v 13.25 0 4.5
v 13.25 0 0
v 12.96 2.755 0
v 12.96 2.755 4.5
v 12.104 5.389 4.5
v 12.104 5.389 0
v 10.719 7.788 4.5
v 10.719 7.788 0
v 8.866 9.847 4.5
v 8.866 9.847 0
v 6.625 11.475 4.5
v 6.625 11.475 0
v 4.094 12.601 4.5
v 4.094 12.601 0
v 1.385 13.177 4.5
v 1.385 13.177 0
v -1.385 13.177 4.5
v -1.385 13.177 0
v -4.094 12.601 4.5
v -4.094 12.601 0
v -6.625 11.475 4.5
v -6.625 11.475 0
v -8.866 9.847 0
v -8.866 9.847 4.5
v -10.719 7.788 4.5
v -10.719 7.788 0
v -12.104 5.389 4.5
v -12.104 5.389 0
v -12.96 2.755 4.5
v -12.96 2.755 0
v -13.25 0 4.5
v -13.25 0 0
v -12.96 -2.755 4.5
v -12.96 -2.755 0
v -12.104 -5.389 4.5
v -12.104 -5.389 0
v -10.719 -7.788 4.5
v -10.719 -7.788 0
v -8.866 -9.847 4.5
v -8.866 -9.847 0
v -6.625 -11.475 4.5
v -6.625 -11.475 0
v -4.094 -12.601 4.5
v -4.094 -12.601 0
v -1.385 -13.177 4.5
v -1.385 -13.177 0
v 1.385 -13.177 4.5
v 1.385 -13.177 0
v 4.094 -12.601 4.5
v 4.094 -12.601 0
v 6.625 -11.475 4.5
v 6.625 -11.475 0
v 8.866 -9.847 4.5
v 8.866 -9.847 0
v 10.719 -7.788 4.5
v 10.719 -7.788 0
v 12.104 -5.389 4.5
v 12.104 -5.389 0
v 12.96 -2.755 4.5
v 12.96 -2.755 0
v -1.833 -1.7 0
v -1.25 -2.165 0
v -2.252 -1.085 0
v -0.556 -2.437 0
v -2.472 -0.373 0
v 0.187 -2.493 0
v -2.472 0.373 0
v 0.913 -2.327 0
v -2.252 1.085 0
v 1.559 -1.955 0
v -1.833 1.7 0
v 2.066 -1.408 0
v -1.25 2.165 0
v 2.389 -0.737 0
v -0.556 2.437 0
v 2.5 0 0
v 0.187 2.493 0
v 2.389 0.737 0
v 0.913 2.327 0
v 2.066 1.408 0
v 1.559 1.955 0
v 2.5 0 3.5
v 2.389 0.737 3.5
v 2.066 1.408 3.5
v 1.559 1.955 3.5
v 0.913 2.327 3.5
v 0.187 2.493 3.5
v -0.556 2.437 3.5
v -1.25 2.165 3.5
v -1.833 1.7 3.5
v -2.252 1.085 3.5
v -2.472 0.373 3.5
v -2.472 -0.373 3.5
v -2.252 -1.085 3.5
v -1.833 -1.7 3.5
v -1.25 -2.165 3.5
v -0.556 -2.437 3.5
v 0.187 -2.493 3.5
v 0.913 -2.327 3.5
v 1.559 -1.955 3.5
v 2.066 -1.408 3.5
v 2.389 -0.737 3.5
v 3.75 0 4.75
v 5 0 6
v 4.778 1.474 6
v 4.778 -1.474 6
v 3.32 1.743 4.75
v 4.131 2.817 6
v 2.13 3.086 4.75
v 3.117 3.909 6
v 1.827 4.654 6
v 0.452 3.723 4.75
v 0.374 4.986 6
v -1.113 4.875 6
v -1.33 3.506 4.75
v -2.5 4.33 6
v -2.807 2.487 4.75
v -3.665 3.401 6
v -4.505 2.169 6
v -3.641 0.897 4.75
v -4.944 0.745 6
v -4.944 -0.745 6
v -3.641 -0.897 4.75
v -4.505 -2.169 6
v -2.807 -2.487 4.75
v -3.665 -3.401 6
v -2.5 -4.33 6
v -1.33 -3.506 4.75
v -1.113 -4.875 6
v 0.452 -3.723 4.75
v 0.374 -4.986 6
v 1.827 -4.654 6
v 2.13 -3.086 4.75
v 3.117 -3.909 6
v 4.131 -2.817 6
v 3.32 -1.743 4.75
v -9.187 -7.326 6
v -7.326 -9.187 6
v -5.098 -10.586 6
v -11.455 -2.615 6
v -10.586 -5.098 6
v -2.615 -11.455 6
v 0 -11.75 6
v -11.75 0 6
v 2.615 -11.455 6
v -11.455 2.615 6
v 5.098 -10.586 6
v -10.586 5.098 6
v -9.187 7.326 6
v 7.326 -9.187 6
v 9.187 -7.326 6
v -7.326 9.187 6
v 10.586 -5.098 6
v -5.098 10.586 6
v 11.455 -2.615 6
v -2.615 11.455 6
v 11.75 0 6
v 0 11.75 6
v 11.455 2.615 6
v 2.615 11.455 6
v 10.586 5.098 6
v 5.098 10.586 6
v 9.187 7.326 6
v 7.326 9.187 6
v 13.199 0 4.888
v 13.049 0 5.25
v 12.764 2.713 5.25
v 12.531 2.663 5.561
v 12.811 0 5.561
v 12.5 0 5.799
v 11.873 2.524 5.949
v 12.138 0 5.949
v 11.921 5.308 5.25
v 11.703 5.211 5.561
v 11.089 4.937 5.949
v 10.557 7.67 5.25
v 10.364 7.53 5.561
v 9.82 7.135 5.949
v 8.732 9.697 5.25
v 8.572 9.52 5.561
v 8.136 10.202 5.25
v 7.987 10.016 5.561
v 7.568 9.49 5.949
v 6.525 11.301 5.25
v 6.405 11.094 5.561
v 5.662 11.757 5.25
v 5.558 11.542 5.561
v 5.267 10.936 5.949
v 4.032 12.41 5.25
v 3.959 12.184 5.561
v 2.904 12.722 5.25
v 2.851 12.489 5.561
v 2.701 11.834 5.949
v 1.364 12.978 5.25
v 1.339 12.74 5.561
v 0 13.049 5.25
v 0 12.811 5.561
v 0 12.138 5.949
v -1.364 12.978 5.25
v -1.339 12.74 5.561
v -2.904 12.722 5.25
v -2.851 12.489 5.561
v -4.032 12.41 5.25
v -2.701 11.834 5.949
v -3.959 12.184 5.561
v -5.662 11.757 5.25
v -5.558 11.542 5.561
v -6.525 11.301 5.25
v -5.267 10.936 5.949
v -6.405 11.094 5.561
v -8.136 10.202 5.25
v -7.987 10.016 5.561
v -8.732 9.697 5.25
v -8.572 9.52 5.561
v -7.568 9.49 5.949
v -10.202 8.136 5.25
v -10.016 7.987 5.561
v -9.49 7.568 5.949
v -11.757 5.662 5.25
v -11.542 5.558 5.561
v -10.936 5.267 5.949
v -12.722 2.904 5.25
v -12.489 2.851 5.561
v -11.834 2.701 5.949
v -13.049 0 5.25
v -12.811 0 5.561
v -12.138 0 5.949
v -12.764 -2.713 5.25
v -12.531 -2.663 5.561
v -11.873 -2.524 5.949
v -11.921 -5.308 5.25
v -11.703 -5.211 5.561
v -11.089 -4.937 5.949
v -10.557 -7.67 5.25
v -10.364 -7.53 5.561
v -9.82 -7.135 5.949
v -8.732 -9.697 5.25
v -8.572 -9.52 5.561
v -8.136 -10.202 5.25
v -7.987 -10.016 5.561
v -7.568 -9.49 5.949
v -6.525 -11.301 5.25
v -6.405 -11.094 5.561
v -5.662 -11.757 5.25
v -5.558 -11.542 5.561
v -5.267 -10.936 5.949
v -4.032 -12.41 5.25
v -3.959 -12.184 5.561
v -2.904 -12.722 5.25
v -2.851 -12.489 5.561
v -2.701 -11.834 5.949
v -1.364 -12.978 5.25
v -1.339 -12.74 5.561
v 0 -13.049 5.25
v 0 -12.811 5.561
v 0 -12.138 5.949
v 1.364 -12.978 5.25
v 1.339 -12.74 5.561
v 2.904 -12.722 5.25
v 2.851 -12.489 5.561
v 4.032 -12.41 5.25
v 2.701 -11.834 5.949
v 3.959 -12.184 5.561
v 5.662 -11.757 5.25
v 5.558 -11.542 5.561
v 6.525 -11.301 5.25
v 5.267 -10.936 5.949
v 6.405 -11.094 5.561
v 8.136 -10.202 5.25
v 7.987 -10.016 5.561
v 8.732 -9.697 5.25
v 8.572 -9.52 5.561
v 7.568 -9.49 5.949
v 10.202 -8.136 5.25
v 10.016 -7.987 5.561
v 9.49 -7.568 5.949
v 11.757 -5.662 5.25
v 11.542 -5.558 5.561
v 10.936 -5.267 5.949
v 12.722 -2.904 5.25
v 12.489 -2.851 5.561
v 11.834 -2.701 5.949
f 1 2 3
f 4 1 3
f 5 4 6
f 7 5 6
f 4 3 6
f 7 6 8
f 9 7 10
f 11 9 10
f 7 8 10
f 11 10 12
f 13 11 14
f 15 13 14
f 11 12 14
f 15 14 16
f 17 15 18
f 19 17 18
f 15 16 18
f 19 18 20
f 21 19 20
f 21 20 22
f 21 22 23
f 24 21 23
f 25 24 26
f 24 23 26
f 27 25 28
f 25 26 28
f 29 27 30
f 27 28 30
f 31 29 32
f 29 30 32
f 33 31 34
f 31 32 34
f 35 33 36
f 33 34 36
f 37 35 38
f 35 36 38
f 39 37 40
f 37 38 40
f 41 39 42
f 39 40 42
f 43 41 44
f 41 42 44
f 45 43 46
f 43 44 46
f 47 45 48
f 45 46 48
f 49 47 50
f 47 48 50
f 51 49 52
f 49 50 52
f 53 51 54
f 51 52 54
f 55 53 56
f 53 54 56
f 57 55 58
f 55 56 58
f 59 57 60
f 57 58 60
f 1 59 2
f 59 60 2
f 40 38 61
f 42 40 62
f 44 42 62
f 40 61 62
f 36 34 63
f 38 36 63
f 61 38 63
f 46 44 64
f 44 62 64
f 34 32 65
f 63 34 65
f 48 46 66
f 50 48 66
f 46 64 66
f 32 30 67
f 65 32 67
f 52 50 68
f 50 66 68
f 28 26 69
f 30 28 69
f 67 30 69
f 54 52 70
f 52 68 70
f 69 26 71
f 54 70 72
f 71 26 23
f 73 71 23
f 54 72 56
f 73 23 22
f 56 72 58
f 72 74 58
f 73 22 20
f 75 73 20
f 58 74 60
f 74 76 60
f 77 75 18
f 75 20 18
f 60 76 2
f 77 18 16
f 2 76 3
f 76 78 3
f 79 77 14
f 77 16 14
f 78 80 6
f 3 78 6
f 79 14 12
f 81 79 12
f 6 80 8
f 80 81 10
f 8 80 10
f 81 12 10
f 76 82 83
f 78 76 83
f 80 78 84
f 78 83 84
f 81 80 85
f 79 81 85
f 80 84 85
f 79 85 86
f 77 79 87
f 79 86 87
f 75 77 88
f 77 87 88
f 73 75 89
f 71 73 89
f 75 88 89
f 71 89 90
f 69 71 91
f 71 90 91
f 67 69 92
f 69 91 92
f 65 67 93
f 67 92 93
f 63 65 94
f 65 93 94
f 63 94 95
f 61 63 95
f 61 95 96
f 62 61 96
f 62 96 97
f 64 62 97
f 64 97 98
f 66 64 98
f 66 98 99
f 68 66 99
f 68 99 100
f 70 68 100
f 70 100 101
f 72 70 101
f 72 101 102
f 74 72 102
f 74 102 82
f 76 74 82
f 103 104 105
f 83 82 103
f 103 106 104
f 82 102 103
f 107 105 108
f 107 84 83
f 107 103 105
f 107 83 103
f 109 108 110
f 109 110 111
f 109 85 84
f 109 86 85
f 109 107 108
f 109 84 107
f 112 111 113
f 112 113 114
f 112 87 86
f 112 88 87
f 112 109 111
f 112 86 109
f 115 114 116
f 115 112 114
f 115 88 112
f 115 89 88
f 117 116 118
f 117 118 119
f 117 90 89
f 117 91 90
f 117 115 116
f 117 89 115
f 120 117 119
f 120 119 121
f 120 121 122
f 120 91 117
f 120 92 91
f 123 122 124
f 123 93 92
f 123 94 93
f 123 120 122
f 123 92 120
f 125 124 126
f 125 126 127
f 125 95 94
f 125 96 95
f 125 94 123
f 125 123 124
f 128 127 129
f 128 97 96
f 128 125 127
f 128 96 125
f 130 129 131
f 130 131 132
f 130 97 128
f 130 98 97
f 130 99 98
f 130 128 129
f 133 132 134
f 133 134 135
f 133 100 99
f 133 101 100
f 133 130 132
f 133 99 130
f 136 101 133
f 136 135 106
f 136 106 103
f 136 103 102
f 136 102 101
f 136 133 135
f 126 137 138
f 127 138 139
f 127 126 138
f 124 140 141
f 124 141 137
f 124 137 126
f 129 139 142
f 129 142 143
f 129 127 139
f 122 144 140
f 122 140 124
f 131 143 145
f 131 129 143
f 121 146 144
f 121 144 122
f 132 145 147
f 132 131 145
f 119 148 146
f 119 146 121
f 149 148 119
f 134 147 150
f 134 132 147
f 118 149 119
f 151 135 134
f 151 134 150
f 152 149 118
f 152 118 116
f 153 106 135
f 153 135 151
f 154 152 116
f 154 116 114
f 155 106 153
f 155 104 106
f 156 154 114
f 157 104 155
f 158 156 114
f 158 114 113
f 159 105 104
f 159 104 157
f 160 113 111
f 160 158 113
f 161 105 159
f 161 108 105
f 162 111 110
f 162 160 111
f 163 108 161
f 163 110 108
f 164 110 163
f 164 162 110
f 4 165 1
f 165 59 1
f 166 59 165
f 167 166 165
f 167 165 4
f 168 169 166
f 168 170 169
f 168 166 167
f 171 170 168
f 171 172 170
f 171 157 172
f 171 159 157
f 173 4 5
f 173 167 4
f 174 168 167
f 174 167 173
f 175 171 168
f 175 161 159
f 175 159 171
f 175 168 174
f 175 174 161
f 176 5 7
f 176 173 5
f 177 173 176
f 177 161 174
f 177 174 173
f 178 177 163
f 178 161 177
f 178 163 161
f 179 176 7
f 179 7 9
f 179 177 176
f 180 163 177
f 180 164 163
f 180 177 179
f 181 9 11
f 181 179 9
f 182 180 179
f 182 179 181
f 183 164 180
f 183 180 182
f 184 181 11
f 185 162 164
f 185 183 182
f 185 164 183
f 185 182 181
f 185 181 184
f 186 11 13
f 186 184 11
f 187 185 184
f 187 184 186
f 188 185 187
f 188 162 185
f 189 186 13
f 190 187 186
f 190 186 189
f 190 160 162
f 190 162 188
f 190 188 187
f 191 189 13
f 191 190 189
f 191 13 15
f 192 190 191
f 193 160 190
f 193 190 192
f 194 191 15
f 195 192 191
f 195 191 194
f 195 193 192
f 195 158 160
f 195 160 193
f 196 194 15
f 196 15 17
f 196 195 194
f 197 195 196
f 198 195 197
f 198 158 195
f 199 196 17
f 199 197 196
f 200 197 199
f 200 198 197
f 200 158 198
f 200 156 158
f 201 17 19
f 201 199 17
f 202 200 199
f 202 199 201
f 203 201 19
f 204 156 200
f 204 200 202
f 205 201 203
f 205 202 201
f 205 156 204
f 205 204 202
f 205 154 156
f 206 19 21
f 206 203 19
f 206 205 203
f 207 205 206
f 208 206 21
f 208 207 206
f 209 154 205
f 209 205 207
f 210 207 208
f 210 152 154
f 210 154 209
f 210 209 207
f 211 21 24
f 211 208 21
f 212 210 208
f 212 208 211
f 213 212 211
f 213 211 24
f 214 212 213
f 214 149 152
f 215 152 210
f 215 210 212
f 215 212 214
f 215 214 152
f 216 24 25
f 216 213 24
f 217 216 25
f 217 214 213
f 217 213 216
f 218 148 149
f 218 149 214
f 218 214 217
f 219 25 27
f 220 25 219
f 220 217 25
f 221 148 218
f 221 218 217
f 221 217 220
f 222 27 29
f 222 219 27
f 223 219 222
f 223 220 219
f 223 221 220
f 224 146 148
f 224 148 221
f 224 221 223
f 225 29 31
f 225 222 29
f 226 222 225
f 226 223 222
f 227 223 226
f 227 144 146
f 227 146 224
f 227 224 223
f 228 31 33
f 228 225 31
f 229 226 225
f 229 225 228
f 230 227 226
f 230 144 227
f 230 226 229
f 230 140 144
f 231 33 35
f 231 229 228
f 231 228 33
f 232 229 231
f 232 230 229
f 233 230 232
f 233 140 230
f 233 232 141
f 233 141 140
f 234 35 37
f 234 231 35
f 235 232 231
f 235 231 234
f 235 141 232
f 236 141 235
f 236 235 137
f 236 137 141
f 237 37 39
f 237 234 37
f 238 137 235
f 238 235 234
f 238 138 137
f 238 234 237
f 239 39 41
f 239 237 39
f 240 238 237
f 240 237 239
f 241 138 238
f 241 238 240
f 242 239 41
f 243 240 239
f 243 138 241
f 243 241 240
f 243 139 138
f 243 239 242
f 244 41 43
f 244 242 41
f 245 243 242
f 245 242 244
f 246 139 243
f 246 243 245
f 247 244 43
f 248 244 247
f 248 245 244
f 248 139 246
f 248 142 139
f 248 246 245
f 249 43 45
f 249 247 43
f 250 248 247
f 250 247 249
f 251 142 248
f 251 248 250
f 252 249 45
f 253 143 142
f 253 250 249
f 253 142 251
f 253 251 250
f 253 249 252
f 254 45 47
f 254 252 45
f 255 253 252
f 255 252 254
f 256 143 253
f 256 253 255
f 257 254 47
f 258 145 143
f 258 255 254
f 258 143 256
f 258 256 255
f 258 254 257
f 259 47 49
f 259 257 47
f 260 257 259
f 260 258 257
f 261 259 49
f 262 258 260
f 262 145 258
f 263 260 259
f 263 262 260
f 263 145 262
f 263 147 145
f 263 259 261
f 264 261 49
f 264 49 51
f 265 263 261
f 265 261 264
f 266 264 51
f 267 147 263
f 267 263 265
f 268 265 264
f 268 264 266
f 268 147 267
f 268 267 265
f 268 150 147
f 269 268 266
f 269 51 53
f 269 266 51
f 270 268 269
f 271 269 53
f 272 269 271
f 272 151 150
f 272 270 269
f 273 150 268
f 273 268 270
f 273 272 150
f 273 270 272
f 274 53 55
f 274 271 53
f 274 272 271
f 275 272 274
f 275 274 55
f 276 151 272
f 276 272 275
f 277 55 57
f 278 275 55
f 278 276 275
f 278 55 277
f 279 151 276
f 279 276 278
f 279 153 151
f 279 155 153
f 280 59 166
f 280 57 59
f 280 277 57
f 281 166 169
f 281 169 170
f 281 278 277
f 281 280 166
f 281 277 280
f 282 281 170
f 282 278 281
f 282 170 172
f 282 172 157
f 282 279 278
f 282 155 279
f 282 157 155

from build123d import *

# Parameters (mm, degrees)
SKETCH_R     = 13.25
PAD_DEPTH    = 6
FILLET_R     = 1.5
SKETCH001_R  = 2.5
POCKET_DEPTH = 6.001
CHAMFER_SIZE = 2.5


with BuildPart() as part:
    # Sketch → Pad (new body)
    with BuildSketch(Plane.XY):
        Circle(SKETCH_R)
    extrude(amount=PAD_DEPTH)

    # Fillet
    fillet_edges = [part.edges().sort_by_distance(p)[0] for p in [
        (-13.25, 0, 6),
    ]]
    fillet(fillet_edges, radius=FILLET_R)

    # Sketch001 (on Face4 of Fillet) → Pocket (cut, through all)
    with BuildSketch(Plane.XY.offset(6)):
        Circle(SKETCH001_R)
    extrude(amount=-POCKET_DEPTH, mode=Mode.SUBTRACT)

    # Chamfer
    chamfer_edges = [part.edges().sort_by_distance(p)[0] for p in [
        (-2.5, 0, 6),
    ]]
    chamfer(chamfer_edges, length=CHAMFER_SIZE)


solid = part.part
